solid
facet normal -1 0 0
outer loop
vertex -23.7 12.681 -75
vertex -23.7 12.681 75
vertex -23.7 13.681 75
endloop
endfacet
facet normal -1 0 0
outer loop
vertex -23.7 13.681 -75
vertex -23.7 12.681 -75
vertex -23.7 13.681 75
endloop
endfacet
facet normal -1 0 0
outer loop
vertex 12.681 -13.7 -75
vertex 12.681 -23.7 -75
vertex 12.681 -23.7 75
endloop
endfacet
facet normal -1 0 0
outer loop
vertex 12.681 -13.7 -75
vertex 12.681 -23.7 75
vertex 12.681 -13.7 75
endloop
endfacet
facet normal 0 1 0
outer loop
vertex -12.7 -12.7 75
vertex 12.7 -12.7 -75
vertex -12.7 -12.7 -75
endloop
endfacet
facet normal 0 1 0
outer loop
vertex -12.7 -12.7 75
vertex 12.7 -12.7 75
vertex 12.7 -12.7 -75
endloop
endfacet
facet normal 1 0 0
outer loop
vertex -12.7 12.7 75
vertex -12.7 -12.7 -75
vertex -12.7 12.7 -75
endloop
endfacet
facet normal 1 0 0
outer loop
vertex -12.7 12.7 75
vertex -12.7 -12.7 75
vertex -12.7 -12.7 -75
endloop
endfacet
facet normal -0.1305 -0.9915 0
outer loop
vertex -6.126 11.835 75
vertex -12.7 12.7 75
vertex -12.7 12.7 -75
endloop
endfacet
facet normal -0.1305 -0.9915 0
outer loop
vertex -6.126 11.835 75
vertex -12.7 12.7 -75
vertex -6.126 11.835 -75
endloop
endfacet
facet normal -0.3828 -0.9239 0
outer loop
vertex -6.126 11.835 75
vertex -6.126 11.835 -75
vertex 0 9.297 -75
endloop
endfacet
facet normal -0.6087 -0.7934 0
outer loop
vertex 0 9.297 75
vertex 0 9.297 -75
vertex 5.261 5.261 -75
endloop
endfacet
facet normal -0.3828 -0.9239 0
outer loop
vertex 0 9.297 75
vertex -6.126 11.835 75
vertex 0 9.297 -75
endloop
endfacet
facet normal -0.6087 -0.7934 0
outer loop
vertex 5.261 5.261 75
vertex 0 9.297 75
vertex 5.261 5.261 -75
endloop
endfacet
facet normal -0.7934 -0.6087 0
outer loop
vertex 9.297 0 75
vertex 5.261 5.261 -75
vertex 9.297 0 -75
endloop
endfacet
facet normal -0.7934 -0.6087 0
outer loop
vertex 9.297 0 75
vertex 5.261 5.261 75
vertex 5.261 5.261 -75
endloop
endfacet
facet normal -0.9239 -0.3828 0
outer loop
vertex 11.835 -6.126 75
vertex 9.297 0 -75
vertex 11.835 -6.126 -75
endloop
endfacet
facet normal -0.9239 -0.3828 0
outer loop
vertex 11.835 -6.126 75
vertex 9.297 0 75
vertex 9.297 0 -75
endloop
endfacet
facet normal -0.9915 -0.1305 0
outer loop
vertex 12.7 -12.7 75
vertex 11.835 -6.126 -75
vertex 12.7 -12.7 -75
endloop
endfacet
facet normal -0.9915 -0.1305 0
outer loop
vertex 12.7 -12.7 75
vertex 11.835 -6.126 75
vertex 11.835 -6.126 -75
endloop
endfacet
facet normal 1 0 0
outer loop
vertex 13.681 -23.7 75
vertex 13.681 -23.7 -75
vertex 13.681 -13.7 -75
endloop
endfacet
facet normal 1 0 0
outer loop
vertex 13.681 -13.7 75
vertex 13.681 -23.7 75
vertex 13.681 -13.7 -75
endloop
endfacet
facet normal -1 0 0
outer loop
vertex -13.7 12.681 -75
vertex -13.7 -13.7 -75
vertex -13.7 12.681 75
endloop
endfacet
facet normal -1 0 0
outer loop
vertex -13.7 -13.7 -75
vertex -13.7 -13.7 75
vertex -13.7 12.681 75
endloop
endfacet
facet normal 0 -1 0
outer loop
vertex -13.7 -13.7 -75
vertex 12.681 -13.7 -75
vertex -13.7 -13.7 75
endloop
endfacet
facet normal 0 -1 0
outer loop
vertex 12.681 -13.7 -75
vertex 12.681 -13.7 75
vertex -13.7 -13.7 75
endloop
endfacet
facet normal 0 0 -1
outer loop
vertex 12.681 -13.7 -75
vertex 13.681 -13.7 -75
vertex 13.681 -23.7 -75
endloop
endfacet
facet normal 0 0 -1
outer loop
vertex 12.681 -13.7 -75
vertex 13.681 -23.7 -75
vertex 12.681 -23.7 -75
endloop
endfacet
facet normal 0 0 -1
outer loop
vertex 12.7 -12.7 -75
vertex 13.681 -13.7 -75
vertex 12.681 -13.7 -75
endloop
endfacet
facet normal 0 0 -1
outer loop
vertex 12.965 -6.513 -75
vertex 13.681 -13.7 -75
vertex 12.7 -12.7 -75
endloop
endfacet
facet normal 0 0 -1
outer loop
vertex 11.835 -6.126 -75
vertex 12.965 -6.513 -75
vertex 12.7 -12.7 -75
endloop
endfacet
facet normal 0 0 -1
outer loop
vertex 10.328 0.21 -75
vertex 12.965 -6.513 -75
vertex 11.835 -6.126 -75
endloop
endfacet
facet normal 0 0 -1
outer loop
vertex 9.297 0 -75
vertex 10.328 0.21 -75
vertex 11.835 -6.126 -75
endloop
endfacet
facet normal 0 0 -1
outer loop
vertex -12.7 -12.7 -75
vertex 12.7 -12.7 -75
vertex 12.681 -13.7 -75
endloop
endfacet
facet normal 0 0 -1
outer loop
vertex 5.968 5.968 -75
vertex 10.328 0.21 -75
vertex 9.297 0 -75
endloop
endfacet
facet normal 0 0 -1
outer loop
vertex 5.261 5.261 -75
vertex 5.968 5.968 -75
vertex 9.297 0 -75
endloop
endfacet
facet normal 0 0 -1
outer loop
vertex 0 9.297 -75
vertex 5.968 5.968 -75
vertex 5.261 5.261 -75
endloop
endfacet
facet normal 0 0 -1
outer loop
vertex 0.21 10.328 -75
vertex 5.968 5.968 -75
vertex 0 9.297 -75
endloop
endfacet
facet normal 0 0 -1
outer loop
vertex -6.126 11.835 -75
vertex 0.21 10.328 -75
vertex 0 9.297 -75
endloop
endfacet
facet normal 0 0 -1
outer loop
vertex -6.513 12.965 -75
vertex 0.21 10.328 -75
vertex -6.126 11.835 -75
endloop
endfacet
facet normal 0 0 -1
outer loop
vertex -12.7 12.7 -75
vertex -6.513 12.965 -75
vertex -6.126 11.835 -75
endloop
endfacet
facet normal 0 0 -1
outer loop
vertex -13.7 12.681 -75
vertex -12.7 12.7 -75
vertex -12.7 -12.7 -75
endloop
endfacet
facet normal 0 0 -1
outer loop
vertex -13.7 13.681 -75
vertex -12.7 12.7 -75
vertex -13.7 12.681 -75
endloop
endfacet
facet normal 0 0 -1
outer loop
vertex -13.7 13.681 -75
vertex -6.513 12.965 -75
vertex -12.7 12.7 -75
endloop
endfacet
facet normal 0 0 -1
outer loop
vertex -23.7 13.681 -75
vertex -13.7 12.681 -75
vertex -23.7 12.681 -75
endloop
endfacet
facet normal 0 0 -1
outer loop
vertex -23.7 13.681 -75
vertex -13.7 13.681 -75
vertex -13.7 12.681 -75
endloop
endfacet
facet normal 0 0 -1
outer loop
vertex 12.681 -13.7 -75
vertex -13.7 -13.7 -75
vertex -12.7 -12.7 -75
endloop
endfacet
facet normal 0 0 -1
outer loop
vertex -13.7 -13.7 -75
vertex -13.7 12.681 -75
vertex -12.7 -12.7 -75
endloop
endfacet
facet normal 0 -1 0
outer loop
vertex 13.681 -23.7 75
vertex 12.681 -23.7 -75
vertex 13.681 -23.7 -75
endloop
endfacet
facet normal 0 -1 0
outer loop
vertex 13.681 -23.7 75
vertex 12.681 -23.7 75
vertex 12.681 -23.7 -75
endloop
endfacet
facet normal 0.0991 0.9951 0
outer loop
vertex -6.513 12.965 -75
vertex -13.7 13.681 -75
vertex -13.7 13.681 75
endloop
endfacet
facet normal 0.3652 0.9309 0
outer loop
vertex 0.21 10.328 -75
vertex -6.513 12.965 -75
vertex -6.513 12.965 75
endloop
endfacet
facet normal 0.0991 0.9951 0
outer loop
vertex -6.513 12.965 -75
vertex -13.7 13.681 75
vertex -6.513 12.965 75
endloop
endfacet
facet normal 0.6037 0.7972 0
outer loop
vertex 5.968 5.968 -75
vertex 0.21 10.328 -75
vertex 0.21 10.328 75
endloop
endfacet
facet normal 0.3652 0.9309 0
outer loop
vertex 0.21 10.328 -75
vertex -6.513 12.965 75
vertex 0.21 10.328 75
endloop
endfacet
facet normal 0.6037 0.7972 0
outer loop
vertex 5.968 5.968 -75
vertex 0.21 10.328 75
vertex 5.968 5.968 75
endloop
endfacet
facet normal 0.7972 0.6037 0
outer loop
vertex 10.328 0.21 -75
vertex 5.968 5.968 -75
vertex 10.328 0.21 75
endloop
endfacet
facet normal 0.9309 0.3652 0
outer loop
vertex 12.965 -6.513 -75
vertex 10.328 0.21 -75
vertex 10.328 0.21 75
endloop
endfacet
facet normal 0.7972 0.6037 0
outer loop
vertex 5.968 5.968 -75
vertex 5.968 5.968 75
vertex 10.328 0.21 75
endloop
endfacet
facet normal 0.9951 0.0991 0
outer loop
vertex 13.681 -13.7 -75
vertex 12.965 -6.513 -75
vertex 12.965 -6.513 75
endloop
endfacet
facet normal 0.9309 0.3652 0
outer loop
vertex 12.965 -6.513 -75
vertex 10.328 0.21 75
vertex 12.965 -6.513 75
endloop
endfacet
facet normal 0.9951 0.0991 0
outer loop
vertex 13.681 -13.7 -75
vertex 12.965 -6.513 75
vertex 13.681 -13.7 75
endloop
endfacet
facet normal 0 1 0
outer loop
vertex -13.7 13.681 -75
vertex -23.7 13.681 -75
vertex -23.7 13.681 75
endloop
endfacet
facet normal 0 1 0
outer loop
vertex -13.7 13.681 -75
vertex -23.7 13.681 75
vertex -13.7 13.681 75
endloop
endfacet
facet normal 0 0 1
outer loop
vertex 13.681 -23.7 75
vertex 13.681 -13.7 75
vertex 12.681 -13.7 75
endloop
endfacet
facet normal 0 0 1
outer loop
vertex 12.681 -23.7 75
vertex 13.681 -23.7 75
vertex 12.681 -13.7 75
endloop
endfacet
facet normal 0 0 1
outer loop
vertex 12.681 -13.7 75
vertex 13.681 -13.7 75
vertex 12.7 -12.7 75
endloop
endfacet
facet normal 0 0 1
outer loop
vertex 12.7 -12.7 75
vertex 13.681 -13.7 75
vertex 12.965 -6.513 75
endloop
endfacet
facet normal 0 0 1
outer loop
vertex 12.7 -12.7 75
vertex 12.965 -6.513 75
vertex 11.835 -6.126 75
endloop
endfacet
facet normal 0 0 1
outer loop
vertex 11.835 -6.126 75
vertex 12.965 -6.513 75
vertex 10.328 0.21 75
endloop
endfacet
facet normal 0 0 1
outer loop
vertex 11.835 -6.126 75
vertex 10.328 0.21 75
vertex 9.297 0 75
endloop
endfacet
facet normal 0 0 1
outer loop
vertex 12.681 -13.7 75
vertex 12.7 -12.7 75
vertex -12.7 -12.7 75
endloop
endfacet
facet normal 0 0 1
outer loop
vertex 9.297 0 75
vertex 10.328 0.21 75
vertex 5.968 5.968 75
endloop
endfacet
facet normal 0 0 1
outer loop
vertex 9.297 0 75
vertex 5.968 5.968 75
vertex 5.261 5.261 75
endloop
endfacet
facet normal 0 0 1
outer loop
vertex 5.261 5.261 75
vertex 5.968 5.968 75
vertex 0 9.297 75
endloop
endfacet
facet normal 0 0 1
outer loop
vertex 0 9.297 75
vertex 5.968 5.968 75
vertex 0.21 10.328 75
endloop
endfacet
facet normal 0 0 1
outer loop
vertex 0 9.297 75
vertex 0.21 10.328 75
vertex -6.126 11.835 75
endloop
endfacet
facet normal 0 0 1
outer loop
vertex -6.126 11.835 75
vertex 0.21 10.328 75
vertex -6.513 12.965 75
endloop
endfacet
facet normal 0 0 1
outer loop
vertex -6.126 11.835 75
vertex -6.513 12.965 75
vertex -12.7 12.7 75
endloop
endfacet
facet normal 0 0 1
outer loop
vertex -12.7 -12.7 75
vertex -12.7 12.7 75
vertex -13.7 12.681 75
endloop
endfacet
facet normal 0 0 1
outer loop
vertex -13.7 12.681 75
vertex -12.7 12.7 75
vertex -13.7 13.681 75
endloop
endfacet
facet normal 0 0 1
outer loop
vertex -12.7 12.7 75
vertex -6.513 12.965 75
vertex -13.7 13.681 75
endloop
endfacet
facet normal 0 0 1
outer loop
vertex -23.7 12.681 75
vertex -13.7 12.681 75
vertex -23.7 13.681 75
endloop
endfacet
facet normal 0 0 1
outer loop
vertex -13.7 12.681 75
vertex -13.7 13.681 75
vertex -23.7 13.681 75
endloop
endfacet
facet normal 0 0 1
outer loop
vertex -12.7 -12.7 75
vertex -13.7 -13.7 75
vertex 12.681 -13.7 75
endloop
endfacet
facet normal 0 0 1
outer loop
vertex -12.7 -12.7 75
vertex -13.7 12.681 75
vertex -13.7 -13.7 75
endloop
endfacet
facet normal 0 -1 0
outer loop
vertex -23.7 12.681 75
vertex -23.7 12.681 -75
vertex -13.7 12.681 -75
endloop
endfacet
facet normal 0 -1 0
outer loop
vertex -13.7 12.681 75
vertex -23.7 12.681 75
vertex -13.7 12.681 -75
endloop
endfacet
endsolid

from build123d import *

# Parameters (mm, degrees)
CROQUIS1_W              = 10
CROQUIS1_H              = 1
CROQUIS1_W_2            = 1
CROQUIS1_H_2            = 10
SALIENTE_EXTRUIR1_DEPTH = 75


with BuildPart() as part:
    # Croquis1 → Saliente-Extruir1 (new body, symmetric)
    with BuildSketch(Plane.XY):
        with BuildLine():
            ThreePointArc((-13.7, 13.681053808), (5.967619023, 5.967619023), (13.681053808, -13.7))
            Line((13.681053808, -13.7), (-13.7, -13.7))
            Line((-13.7, -13.7), (-13.7, 13.681053808))
        make_face()
        with BuildLine():
            Line((-12.7, -12.7), (-12.7, 12.7))
            ThreePointArc((-12.7, 12.7), (5.260512242, 5.260512242), (12.7, -12.7))
            Line((12.7, -12.7), (-12.7, -12.7))
        make_face(mode=Mode.SUBTRACT)
        with Locations((-18.7, 13.181053808)):
            Rectangle(CROQUIS1_W, CROQUIS1_H)
        with Locations((13.181053808, -18.7)):
            Rectangle(CROQUIS1_W_2, CROQUIS1_H_2)
    extrude(amount=SALIENTE_EXTRUIR1_DEPTH, both=True)


solid = part.part
